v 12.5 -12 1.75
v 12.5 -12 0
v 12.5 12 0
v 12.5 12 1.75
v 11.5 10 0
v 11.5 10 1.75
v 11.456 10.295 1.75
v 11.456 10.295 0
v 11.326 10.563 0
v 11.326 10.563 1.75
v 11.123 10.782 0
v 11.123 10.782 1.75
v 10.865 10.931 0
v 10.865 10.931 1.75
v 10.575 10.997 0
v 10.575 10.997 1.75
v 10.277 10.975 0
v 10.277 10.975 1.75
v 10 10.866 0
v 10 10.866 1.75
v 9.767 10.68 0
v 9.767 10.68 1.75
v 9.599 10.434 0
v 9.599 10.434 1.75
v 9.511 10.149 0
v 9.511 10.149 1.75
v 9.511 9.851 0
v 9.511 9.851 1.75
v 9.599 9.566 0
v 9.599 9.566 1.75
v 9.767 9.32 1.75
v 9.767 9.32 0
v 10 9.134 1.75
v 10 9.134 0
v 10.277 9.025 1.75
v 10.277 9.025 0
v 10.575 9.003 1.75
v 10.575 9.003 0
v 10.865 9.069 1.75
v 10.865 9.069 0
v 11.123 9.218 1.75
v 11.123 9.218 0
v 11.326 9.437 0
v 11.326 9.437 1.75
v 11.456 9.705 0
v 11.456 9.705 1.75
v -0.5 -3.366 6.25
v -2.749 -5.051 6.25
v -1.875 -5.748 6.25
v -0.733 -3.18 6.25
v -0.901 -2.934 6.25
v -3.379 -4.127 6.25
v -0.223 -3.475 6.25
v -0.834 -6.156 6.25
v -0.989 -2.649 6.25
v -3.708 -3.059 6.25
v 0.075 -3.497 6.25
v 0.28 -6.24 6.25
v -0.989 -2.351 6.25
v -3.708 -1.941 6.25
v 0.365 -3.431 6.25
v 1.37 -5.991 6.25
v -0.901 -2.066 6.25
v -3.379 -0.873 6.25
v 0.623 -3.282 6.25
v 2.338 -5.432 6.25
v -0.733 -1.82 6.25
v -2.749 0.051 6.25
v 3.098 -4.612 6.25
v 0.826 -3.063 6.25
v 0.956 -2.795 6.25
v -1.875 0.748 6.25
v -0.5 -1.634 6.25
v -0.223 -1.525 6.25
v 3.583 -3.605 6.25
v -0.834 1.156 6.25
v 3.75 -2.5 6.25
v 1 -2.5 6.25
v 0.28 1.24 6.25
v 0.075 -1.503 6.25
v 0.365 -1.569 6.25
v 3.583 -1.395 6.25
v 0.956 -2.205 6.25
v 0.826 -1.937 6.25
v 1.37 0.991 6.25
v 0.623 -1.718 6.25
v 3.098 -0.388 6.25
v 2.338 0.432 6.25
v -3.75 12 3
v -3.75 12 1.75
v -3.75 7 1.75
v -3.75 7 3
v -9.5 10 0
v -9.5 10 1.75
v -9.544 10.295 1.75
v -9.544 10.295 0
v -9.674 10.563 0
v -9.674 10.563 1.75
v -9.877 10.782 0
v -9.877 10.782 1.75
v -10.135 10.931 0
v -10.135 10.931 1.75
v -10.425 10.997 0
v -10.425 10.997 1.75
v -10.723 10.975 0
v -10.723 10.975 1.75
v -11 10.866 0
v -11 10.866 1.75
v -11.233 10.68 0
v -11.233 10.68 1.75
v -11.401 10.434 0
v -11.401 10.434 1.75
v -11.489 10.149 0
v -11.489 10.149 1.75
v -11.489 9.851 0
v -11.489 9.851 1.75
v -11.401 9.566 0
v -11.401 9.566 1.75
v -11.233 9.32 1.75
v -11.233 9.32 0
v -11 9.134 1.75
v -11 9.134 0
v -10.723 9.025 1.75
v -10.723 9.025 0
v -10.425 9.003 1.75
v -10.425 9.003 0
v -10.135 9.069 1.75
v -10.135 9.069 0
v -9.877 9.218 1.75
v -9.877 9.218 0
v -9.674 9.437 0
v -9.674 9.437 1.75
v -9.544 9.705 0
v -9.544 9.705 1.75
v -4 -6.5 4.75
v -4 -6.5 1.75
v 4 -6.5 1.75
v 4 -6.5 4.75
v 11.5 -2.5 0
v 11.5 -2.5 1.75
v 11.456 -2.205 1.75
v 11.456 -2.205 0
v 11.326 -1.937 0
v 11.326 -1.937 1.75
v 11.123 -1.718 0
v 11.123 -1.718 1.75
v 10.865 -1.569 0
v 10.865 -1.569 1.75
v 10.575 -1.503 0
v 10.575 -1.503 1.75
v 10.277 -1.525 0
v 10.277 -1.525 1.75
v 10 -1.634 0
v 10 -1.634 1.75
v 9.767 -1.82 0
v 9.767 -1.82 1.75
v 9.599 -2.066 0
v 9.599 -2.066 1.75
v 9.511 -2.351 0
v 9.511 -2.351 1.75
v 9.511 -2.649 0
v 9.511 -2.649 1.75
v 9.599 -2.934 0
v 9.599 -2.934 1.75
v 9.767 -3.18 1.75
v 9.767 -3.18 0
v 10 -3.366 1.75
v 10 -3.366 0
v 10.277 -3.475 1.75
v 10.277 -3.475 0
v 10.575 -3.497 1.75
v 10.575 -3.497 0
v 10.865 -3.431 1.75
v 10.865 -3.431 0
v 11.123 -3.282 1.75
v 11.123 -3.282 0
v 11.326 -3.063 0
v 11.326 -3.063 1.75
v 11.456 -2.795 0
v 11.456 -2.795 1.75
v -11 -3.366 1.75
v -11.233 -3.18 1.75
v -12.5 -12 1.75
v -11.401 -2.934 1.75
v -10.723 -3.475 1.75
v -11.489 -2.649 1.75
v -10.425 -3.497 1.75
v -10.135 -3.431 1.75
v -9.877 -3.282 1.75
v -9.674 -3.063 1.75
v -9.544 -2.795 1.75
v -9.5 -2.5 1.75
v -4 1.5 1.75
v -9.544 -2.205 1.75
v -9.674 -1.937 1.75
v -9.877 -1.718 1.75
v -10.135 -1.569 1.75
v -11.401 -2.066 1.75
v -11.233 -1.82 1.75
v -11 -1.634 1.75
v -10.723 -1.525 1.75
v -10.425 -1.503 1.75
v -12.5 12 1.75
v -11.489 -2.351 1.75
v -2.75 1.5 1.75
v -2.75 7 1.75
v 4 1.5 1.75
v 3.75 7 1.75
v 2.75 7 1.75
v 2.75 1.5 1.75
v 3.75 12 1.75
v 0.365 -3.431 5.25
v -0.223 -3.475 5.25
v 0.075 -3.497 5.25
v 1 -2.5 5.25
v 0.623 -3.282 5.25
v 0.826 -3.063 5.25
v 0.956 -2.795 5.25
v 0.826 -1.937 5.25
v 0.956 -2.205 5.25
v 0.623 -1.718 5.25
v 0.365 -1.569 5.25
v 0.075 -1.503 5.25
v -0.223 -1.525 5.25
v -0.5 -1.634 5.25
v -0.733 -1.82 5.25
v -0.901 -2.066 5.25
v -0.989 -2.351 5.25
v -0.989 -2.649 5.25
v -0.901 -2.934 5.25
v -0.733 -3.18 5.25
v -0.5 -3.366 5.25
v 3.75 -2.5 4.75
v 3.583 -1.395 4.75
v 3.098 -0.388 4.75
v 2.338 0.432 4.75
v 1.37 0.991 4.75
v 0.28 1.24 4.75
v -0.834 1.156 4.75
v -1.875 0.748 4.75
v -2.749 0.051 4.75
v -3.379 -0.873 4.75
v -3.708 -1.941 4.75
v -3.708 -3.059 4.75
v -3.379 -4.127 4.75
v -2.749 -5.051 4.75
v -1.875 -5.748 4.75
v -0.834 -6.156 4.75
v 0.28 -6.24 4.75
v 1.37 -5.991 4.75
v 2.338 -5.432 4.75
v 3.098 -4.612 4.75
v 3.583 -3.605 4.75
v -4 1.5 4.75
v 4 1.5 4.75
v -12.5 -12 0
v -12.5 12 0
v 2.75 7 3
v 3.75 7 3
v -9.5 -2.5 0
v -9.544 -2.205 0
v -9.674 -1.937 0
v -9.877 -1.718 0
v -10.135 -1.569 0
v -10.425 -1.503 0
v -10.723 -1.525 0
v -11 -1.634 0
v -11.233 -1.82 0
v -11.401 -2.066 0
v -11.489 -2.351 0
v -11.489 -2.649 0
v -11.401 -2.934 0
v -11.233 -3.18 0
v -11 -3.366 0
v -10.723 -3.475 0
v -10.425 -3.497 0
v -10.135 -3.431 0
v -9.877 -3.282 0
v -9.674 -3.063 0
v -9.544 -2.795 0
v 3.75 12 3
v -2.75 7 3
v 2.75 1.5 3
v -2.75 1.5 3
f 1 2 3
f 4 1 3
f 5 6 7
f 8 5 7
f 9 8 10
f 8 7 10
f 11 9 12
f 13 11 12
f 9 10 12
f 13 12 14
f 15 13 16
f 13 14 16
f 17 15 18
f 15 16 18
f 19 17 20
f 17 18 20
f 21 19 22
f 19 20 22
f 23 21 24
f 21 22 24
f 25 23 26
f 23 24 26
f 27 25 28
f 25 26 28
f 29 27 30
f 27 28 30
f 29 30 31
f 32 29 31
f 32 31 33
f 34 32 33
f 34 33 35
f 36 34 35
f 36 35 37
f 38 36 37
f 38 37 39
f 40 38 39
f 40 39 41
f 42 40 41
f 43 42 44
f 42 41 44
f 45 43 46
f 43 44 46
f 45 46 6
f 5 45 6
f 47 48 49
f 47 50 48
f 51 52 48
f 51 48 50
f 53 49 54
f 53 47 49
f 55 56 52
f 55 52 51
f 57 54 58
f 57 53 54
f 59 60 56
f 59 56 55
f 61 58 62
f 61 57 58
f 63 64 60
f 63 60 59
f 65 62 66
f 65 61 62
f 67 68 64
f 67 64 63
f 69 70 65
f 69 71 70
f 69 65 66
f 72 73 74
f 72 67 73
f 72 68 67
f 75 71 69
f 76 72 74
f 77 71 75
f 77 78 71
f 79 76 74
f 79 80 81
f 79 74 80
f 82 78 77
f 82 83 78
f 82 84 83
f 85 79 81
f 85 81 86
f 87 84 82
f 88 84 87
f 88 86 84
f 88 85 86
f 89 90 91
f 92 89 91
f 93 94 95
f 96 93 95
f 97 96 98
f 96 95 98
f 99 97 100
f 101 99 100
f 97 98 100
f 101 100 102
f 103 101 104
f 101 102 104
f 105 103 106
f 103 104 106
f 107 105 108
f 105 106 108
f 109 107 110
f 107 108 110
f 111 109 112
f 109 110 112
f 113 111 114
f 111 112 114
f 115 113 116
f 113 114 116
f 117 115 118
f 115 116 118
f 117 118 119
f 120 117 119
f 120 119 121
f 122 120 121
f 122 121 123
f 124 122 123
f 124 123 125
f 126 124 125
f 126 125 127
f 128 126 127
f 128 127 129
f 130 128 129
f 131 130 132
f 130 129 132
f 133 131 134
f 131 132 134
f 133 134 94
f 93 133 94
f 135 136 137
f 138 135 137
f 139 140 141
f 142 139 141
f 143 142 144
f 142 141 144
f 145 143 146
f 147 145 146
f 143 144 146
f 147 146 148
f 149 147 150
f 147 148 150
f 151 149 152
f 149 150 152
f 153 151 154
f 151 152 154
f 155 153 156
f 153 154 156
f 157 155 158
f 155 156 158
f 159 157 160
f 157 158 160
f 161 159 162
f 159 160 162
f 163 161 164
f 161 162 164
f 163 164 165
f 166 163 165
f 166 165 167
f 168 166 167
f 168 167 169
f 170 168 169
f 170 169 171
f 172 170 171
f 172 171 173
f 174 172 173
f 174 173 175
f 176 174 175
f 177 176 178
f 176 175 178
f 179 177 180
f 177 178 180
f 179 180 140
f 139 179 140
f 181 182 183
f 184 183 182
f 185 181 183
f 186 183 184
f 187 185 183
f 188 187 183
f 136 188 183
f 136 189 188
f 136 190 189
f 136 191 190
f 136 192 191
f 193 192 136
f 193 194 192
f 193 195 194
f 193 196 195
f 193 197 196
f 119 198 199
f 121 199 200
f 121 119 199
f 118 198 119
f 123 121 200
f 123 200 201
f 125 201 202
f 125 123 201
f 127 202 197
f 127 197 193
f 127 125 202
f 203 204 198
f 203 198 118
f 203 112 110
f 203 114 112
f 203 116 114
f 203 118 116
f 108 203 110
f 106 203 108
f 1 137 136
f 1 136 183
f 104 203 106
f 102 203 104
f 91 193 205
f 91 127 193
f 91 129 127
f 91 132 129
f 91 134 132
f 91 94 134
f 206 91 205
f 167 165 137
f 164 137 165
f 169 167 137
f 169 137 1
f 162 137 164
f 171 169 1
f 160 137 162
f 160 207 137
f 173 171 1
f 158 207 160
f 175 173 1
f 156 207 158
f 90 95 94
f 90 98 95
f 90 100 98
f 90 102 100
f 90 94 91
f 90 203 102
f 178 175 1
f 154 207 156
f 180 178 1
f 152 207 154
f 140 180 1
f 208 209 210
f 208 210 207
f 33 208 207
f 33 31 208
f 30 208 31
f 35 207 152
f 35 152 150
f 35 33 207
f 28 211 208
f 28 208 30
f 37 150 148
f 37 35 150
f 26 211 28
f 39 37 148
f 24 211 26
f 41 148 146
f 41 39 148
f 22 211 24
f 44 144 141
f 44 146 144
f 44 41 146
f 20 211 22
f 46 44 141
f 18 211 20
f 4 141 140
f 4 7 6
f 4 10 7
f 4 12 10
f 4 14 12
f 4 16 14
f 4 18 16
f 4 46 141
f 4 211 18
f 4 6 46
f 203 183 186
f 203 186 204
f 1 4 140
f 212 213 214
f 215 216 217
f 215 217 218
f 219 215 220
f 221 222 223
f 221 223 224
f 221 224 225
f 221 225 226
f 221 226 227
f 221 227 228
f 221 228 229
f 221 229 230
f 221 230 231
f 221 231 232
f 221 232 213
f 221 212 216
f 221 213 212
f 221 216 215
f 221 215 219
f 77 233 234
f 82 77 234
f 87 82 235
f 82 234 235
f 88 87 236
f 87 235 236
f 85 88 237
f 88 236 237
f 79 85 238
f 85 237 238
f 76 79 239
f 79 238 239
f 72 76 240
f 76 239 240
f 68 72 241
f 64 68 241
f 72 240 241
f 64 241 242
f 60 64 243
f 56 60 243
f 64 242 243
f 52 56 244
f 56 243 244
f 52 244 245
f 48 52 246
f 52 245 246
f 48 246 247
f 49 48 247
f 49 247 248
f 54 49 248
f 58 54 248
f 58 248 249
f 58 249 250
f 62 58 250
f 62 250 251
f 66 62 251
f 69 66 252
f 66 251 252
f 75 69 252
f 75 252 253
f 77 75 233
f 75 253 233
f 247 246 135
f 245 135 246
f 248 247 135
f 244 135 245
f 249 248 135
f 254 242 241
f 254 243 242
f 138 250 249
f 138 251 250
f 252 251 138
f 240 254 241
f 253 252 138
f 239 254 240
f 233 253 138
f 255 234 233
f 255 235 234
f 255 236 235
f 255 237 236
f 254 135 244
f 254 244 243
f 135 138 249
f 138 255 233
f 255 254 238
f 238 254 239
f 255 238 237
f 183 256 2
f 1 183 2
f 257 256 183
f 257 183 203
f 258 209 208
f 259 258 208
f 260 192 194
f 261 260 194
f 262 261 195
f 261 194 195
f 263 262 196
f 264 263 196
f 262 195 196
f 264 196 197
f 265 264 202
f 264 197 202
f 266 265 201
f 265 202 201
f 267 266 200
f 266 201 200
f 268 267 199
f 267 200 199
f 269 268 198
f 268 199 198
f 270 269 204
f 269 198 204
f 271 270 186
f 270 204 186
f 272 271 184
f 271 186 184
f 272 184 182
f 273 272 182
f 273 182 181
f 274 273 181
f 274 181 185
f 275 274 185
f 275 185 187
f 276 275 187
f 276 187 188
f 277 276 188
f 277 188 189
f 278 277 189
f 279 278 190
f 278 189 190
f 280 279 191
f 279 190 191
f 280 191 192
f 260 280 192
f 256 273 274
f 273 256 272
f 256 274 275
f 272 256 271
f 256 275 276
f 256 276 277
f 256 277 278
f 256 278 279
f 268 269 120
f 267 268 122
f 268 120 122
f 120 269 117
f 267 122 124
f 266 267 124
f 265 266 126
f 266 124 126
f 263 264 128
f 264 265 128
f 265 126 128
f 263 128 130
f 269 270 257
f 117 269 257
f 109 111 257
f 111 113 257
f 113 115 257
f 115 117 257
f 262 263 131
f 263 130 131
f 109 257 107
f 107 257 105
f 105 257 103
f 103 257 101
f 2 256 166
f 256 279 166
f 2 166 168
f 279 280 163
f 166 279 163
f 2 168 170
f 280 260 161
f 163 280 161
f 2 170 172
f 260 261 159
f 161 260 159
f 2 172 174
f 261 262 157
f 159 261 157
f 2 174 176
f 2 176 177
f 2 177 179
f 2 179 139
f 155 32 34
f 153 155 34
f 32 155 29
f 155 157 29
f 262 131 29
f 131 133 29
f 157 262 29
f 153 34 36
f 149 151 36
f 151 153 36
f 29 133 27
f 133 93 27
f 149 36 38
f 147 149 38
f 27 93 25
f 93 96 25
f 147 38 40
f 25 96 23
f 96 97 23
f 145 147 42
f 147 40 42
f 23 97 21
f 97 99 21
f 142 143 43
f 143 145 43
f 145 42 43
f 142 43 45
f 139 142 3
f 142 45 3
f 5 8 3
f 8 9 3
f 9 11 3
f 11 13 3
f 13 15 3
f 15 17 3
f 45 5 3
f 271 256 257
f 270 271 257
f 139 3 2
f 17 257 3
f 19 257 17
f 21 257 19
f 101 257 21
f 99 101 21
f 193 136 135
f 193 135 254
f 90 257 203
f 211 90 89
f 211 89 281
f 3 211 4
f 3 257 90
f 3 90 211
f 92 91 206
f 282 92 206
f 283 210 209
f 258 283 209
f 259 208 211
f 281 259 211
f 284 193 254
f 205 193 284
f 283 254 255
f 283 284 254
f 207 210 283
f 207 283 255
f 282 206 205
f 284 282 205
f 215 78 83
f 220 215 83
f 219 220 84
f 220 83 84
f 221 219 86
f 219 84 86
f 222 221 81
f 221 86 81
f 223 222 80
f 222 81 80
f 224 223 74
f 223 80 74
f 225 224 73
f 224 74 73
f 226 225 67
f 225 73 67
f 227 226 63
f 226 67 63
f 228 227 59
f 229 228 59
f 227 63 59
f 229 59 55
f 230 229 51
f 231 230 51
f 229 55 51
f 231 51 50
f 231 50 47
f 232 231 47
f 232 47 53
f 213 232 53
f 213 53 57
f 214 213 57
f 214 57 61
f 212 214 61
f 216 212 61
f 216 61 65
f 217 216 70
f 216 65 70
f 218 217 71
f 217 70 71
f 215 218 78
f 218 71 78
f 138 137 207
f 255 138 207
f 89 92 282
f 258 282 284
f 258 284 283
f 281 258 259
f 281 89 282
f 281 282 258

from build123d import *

# Parameters (mm, degrees)
SKETCH_W        = 25
SKETCH_H        = 24
PAD_DEPTH       = 1.75
SKETCH001_R     = 1
POCKET_DEPTH    = 1.75
SKETCH002_W     = 8
SKETCH002_H     = 8
PAD001_DEPTH    = 3
SKETCH003_R     = 3.75
PAD002_DEPTH    = 1.5
SKETCH004_R     = 1
POCKET001_DEPTH = 1
PAD003_DEPTH    = 1.25


with BuildPart() as part:
    # Sketch → Pad (new body)
    with BuildSketch(Plane.XY):
        Rectangle(SKETCH_W, SKETCH_H)
    extrude(amount=PAD_DEPTH)

    # Sketch001 (on Face6 of Pad) → Pocket (cut)
    with BuildSketch(Plane.XY.offset(1.75)):
        with Locations((-10.5, 10)):
            Circle(SKETCH001_R)
        with Locations((10.5, 10)):
            Circle(SKETCH001_R)
        with Locations((-10.5, -2.5)):
            Circle(SKETCH001_R)
        with Locations((10.5, -2.5)):
            Circle(SKETCH001_R)
    extrude(amount=-POCKET_DEPTH, mode=Mode.SUBTRACT)

    # Sketch002 (on Face5 of Pocket) → Pad001 (join)
    with BuildSketch(Plane.XY.offset(1.75)):
        with Locations((0, -2.5)):
            Rectangle(SKETCH002_W, SKETCH002_H)
    extrude(amount=PAD001_DEPTH)

    # Sketch003 (on Face15 of Pad001) → Pad002 (join)
    with BuildSketch(Plane.XY.offset(4.75)):
        with Locations((0, -2.5)):
            Circle(SKETCH003_R)
    extrude(amount=PAD002_DEPTH)

    # Sketch004 (on Face17 of Pad002) → Pocket001 (cut)
    with BuildSketch(Plane.XY.offset(6.25)):
        with Locations((0, -2.5)):
            Circle(SKETCH004_R)
    extrude(amount=-POCKET001_DEPTH, mode=Mode.SUBTRACT)

    # Sketch005 (on Face5 of Pocket001) → Pad003 (join)
    with BuildSketch(Plane.XY.offset(1.75)):
        Polygon((-3.75, 12), (-3.75, 7), (-2.75, 7), (-2.75, 1.5), (2.75, 1.5), (2.75, 7), (3.75, 7), (3.75, 12), align=None)
    extrude(amount=PAD003_DEPTH)


solid = part.part
